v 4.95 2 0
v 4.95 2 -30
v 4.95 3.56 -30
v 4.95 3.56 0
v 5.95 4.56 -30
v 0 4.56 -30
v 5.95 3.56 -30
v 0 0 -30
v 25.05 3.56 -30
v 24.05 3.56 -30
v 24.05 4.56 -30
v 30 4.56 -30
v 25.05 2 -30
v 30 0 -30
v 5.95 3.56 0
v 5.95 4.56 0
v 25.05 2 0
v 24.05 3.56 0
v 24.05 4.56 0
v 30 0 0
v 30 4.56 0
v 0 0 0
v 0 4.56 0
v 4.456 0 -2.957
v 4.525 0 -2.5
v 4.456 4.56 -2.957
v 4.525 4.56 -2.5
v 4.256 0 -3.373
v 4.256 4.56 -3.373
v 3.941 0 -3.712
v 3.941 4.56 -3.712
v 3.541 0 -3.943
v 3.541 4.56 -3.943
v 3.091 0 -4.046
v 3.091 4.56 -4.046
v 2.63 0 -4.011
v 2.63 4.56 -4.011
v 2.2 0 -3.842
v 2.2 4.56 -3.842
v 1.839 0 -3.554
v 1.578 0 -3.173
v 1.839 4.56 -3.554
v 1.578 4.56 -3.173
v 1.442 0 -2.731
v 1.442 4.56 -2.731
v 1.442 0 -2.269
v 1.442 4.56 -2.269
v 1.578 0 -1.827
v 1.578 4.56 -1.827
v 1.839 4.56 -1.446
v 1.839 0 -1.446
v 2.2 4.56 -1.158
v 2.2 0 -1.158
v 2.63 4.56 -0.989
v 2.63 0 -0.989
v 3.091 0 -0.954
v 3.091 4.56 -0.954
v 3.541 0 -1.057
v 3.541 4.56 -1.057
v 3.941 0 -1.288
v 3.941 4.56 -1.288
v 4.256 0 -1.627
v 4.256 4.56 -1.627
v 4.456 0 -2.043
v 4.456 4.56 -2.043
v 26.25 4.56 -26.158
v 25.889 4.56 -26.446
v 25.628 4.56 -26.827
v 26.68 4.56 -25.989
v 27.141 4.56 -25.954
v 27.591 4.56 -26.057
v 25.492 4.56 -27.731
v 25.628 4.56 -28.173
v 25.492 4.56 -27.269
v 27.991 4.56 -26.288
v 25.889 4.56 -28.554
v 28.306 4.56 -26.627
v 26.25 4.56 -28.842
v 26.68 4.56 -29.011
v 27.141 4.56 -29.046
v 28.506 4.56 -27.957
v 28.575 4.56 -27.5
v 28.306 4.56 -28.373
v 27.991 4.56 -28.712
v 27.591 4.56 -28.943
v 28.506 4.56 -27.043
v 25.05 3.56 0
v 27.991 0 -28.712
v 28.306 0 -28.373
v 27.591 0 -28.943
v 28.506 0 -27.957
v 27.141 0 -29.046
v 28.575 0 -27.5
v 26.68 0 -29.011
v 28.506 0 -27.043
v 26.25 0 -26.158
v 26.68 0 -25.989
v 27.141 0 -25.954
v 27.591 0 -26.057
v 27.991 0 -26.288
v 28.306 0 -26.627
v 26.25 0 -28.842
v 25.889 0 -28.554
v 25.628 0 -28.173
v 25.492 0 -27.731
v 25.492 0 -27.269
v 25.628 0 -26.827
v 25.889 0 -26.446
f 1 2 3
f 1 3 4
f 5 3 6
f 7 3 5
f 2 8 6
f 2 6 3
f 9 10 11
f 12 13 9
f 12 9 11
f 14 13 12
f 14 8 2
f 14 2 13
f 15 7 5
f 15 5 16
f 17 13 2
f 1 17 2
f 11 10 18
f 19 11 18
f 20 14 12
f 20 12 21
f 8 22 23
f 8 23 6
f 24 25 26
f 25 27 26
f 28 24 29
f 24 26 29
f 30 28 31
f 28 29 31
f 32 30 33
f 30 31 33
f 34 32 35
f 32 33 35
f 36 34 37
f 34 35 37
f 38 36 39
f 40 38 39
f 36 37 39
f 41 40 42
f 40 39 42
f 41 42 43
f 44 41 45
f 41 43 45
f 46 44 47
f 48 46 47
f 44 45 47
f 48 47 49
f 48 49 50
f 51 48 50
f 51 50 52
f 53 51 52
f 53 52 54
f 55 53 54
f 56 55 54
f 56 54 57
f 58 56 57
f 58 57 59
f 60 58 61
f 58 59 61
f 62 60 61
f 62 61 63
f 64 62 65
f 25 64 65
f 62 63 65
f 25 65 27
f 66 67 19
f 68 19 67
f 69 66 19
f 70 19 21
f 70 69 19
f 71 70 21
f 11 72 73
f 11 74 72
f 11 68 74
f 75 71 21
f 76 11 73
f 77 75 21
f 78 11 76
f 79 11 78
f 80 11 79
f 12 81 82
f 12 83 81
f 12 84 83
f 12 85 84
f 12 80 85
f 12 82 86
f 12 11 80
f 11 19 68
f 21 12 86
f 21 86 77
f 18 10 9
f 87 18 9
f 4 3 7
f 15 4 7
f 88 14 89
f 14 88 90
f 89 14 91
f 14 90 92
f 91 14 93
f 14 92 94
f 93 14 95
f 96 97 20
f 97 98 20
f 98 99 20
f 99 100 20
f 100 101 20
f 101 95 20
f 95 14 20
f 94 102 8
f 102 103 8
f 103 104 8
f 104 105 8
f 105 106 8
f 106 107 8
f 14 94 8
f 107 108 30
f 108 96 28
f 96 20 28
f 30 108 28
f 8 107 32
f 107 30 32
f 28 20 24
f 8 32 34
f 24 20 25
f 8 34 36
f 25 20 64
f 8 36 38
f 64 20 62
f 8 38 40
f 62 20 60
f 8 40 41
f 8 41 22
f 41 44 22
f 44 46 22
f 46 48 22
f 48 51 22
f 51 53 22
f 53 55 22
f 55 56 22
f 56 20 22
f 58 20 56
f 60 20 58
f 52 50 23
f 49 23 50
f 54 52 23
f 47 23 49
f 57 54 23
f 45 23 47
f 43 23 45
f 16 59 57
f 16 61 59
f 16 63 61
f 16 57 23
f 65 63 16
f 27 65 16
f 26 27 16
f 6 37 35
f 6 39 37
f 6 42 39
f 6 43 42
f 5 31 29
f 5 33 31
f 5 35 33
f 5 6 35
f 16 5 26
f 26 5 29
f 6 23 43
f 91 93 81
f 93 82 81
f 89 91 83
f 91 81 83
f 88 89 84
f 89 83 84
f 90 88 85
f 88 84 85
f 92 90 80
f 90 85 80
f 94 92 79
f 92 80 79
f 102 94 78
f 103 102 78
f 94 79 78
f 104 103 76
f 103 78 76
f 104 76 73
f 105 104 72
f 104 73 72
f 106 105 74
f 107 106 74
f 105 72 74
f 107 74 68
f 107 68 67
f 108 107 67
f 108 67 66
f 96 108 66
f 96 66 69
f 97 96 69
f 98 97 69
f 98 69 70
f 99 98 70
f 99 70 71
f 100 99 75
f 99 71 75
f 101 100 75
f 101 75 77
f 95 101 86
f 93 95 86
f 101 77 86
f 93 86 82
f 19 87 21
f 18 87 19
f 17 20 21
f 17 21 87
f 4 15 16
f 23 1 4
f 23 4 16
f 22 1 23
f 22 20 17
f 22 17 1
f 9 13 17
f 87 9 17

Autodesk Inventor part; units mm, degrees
ref_plane "YZ Plane" through (0, 0, 0) normal (1, 0, 0) x (0, 1, 0)
ref_plane "XZ Plane" through (0, 0, 0) normal (0, 1, 0) x (-1, 0, 0)
ref_plane "XY Plane" through (0, 0, 0) normal (0, 0, 1) x (1, 0, 0)
sketch "Sketch1" plane through (0, 0, 0) normal (0, 1, 0) x (-1, 0, 0)
  line L0 (0, 0) -> (0, -30)
  line L1 (0, -30) -> (-30, -30)
  line L2 (-30, -30) -> (-30, 0)
  line L3 (-30, 0) -> (0, 0)
  dimension "d0" = 30
  dimension "d1" = 30
extrude "Extrusion1" add sketch "Sketch1" along normal blind 2
sketch "Sketch2" plane through (0, 2, 0) normal (0, 1, 0) x (1, 0, 0)
  line L0 (0, 30) -> (0, 0) projected
  line L1 (25.05, 0) -> (30, 0)
  line L2 (30, 0) -> (30, 30) projected
  line L3 (30, 0) -> (30, 30)
  line L4 (30, 30) -> (25.05, 30)
  line L5 (25.05, 30) -> (25.05, 0)
  line L6 (30, 0) -> (30, 30)
  line L7 (0, 0) -> (30, 0) projected
  line L8 (30, 30) -> (0, 30) projected
  line L9 (4.95, 0) -> (0, 0)
  line L10 (0, 0) -> (0, 30)
  line L11 (0, 30) -> (4.95, 30)
  line L12 (4.95, 30) -> (4.95, 0)
  point P0 (4.95, 0)
extrude "Extrusion2" add sketch "Sketch2" along normal blind 1.56 contours L8 L12 L7 L0 | L4 L2 L1 L5
sketch "Sketch3" plane through (0, 3.56, 0) normal (0, 1, 0) x (1, 0, 0)
  line L0 (0, 30) -> (0, 0) projected
  line L1 (0, 0) -> (0, 30)
  line L2 (0, 30) -> (5.95, 30)
  line L3 (5.95, 30) -> (5.95, 0)
  line L4 (5.95, 0) -> (0, 0)
  line L5 (4.95, 0) -> (25.05, 0) projected
  line L6 (25.05, 30) -> (4.95, 30) projected
  line L7 (30, 30) -> (30, 0)
  line L8 (30, 0) -> (30, 30)
  line L9 (30, 30) -> (24.05, 30)
  line L10 (24.05, 30) -> (24.05, 0)
  line L11 (24.05, 0) -> (30, 0)
  point P0 (24.05, 0)
  dimension "d8" = 30
  dimension "d9" = 5.95
extrude "Extrusion3" add sketch "Sketch3" along normal blind 1 contours L2 L3 L4 L0 | L6 L9 L7 L11 L5 L10
sketch "Sketch5" plane through (0, 4.56, 0) normal (0, 1, 0) x (1, 0, 0)
  circle A0 centre (2.975, 2.5) radius 1.55
  circle A1 centre (27.025, 27.5) radius 1.55
  line L0 (30, 30) -> (24.05, 30) projected
  line L1 (30, 0) -> (30, 30) projected
  line L2 (0, 30) -> (0, 0) projected
  line L3 (0, 0) -> (5.95, 0) projected
  dimension "d13" = 3.1
  dimension "d14" = 3.1
  dimension "d15" = 2.5
  dimension "d16" = 2.975
  dimension "d18" = 2.975
  dimension "d19" = 2.5
extrude "Extrusion4" cut sketch "Sketch5" against normal blind 10
sketch "Sketch6" plane through (0, 2, 0) normal (0, 1, 0) x (1, 0, 0)
  circle A0 centre (27.025, 27.5) radius 1.55 projected
  point P0 (0, 0)
properties part number "rplidar_adapter_board_holder" material "PET Plastic"
